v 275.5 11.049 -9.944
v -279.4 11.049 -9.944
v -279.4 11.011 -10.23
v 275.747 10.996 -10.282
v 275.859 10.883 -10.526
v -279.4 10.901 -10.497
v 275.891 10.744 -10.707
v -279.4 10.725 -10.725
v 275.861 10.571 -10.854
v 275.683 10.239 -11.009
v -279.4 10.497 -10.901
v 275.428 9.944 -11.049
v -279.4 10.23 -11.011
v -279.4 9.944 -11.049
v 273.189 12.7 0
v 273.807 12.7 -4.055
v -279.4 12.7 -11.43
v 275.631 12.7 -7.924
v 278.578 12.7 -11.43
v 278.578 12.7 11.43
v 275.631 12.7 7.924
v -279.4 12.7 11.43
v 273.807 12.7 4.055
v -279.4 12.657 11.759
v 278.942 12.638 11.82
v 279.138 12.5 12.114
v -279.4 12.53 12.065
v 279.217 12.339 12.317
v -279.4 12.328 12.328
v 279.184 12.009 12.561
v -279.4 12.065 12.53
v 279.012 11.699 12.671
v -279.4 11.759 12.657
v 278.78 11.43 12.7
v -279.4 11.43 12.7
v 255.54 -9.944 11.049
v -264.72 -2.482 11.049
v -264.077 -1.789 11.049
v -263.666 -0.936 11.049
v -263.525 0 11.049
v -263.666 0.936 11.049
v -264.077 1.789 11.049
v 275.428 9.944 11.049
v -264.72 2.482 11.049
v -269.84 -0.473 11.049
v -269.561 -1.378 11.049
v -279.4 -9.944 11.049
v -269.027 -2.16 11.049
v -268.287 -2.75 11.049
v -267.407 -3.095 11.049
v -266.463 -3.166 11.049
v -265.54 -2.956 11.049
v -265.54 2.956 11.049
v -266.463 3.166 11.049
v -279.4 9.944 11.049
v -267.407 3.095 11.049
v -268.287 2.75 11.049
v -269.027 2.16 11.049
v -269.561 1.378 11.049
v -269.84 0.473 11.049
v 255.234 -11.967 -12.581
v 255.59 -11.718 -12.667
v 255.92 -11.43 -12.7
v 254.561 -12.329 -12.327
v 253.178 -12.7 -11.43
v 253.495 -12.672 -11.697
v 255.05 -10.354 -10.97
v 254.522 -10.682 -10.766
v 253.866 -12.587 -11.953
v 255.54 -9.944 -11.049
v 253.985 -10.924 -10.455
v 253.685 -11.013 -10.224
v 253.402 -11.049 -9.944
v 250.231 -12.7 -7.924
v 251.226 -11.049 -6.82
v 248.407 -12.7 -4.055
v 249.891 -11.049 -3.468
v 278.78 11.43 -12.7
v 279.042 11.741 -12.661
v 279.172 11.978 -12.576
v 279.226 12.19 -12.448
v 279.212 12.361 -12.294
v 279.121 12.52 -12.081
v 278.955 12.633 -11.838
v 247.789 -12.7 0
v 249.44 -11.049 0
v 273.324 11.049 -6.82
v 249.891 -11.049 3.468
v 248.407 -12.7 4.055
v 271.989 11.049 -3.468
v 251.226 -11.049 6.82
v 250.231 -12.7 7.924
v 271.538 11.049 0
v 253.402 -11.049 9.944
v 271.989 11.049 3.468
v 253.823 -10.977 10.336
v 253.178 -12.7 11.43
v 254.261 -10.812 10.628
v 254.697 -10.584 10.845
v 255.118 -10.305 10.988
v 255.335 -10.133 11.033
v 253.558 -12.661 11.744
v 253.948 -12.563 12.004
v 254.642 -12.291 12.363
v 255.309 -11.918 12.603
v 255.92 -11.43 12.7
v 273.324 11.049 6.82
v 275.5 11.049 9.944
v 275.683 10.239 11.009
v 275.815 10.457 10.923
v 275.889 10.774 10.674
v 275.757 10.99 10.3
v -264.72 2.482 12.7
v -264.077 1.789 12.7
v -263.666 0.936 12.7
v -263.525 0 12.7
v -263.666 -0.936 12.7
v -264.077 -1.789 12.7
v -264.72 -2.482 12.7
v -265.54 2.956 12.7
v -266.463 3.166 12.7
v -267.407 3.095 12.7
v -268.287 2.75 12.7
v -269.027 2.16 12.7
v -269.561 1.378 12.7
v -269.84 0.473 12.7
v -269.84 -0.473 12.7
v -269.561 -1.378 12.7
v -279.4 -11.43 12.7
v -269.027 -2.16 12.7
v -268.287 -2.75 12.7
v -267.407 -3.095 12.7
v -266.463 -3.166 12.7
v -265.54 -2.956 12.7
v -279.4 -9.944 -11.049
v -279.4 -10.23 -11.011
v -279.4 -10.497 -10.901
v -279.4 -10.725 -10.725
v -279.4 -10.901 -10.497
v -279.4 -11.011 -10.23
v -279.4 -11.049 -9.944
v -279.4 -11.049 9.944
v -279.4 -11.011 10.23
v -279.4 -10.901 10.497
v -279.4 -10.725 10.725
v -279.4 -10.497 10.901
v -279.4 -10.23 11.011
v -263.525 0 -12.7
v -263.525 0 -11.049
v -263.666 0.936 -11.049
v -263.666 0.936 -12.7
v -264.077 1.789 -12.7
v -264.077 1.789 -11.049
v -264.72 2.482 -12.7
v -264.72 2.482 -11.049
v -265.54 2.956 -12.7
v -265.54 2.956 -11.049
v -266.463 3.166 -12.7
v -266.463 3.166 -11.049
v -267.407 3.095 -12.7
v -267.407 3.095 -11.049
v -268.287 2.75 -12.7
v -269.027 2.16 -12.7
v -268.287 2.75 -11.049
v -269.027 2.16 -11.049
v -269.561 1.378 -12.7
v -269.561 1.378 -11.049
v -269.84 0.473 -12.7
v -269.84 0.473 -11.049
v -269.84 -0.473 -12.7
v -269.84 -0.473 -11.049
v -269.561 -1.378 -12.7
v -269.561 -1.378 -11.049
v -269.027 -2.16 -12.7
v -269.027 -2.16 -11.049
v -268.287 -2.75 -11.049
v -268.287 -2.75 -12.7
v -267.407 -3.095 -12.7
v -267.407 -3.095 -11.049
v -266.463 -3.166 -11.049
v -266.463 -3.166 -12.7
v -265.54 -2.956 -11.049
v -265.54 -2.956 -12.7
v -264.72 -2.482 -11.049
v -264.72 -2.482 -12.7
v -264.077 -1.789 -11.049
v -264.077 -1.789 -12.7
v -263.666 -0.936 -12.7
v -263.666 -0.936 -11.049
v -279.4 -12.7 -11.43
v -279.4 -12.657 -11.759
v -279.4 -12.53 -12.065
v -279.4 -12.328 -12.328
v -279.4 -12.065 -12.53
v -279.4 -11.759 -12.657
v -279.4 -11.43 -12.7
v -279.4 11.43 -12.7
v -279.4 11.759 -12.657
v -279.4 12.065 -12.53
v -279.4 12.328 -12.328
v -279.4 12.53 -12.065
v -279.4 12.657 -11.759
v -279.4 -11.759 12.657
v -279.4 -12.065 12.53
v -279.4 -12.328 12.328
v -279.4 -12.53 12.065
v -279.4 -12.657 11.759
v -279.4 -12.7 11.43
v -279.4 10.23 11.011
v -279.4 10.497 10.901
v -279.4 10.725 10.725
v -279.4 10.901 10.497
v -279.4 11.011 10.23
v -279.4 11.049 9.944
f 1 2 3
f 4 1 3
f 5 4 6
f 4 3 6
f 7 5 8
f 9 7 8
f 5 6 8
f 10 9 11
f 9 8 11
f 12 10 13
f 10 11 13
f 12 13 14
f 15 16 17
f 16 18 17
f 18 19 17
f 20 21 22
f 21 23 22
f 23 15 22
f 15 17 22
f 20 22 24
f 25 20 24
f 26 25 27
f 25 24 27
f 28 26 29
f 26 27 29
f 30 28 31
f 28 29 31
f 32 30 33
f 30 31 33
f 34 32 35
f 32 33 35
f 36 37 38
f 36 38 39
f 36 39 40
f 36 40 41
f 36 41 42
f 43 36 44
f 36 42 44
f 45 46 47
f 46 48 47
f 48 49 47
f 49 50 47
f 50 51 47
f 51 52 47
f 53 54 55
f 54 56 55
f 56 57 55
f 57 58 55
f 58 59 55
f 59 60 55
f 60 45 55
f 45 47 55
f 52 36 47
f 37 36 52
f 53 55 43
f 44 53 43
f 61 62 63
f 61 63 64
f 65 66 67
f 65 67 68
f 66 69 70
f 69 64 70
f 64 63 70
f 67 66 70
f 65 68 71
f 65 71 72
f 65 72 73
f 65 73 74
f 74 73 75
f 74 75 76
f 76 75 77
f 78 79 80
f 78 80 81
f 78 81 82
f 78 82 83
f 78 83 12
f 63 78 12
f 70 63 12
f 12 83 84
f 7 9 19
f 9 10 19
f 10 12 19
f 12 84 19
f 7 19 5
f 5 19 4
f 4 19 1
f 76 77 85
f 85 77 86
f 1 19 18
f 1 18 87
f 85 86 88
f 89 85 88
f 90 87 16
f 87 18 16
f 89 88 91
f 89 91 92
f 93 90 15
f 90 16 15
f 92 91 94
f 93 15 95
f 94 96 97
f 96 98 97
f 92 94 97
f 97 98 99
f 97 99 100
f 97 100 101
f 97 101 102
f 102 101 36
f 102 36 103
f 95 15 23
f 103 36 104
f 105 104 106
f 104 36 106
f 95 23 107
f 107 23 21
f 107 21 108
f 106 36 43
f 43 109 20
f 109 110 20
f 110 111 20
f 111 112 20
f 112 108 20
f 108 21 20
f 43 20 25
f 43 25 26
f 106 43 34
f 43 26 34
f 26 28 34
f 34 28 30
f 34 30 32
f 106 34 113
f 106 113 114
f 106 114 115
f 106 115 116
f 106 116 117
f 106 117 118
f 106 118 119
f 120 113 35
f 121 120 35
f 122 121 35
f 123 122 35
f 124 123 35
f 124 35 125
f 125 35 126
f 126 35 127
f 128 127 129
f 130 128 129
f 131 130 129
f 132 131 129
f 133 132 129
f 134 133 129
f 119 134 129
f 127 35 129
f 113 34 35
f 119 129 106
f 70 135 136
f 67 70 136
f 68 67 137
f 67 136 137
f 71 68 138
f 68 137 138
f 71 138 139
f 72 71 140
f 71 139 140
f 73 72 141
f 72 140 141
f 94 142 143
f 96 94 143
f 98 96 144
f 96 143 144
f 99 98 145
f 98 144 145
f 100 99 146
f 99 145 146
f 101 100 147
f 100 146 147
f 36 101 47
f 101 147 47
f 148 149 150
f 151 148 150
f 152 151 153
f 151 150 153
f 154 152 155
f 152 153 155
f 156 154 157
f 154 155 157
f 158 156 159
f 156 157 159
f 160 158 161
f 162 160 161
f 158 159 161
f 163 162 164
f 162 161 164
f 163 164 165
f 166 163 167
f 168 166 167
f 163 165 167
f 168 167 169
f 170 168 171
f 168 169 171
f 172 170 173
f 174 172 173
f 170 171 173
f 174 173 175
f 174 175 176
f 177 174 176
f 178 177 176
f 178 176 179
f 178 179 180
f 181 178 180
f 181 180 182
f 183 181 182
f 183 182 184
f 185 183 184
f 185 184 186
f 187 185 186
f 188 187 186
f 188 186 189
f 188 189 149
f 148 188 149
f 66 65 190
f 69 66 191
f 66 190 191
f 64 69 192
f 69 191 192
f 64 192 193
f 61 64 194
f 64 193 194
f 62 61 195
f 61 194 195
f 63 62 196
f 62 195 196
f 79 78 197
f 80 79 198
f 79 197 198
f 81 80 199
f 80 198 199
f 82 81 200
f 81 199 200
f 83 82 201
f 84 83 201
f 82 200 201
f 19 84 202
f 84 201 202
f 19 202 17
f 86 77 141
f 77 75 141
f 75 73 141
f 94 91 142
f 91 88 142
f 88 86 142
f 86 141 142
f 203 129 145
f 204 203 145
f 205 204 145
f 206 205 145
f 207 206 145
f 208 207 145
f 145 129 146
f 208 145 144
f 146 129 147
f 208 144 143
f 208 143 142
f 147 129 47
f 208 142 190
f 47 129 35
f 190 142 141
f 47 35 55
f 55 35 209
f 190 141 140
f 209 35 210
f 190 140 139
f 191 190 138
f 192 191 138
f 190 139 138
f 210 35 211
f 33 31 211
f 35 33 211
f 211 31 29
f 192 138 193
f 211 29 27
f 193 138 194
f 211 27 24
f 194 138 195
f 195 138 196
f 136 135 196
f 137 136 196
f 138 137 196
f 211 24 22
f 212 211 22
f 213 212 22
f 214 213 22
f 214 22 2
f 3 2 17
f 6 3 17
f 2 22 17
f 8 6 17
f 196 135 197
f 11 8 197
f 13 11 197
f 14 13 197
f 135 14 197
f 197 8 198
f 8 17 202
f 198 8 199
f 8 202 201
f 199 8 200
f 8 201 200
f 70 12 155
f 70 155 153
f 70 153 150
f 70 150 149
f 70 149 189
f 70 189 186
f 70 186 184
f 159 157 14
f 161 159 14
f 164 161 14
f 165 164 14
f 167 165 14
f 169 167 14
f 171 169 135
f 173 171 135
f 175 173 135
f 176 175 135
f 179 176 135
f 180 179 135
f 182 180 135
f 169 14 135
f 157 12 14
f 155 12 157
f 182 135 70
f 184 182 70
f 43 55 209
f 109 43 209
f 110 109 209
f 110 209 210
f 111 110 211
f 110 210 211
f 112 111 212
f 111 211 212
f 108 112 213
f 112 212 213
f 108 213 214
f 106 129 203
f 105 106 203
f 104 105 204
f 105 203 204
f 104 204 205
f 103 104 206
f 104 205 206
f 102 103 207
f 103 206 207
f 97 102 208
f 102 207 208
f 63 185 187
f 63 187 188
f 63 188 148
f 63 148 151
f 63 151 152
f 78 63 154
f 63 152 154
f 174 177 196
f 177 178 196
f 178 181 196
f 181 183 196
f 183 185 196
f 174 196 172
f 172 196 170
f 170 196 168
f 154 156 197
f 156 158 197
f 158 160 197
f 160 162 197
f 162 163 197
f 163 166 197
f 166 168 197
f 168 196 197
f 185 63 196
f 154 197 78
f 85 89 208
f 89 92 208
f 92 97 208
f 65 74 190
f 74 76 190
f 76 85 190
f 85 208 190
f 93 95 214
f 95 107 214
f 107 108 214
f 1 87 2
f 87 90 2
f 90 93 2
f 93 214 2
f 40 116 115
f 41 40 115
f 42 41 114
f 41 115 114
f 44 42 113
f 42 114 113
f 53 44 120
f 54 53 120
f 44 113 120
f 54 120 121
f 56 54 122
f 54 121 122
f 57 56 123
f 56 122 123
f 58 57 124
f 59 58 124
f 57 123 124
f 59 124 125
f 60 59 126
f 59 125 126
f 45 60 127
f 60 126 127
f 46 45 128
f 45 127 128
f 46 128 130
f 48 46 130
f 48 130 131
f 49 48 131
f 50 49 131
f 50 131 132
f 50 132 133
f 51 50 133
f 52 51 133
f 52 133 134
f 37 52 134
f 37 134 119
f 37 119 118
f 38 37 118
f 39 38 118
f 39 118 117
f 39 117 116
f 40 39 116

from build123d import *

# Parameters (mm, degrees)
BOSS_EXTRUDE1_DEPTH      = 279.4
BOSS_EXTRUDE1_DEPTH_BACK = 279.4
SKETCH5_R                = 3.175
CUT_EXTRUDE1_DEPTH       = 281.839473721
SKETCH6_R                = 19.05
CUT_EXTRUDE2_DEPTH       = 455.280260412


with BuildPart() as part:
    # Sketch4 → Boss-Extrude1 (new, two sides: drawn at the far end of the back side and taken through both)
    with BuildSketch(Plane(origin=(0, 0, 0), x_dir=(0, 0, -1), z_dir=(1, 0, 0)).offset(-BOSS_EXTRUDE1_DEPTH_BACK)):
        with BuildLine():
            Line((12.7, -11.43), (12.7, 11.43))
            ThreePointArc((12.7, 11.43), (12.328025612, 12.328025612), (11.43, 12.7))
            Line((11.43, 12.7), (-11.43, 12.7))
            ThreePointArc((-11.43, 12.7), (-12.328025612, 12.328025612), (-12.7, 11.43))
            Line((-12.7, 11.43), (-12.7, -11.43))
            ThreePointArc((-12.7, -11.43), (-12.328025612, -12.328025612), (-11.43, -12.7))
            Line((-11.43, -12.7), (11.43, -12.7))
            ThreePointArc((11.43, -12.7), (12.328025612, -12.328025612), (12.7, -11.43))
        make_face()
        with BuildLine():
            Line((11.049, 9.9441), (11.049, -9.9441))
            ThreePointArc((11.049, -9.9441), (10.725382283, -10.725382283), (9.9441, -11.049))
            Line((9.9441, -11.049), (-9.9441, -11.049))
            ThreePointArc((-9.9441, -11.049), (-10.725382283, -10.725382283), (-11.049, -9.9441))
            Line((-11.049, -9.9441), (-11.049, 9.9441))
            ThreePointArc((-11.049, 9.9441), (-10.725382283, 10.725382283), (-9.9441, 11.049))
            Line((-9.9441, 11.049), (9.9441, 11.049))
            ThreePointArc((9.9441, 11.049), (10.725382283, 10.725382283), (11.049, 9.9441))
        make_face(mode=Mode.SUBTRACT)
    extrude(amount=BOSS_EXTRUDE1_DEPTH + BOSS_EXTRUDE1_DEPTH_BACK)

    # Sketch5 → Cut-Extrude1 (cut, through all)
    with BuildSketch(Plane.XY.offset(12.7)):
        with Locations((-266.7, 0)):
            Circle(SKETCH5_R)
    extrude(amount=-CUT_EXTRUDE1_DEPTH, mode=Mode.SUBTRACT)

    # Sketch6 → Cut-Extrude2 (cut, through all)
    with BuildSketch(Plane(origin=(146.05, 146.05, 0), x_dir=(0, 0, 1), z_dir=(0.7071067811865464, 0.7071067811865488, 0))):
        with Locations((0, 203.243890785)):
            Circle(SKETCH6_R)
    extrude(amount=-CUT_EXTRUDE2_DEPTH, mode=Mode.SUBTRACT)


solid = part.part
